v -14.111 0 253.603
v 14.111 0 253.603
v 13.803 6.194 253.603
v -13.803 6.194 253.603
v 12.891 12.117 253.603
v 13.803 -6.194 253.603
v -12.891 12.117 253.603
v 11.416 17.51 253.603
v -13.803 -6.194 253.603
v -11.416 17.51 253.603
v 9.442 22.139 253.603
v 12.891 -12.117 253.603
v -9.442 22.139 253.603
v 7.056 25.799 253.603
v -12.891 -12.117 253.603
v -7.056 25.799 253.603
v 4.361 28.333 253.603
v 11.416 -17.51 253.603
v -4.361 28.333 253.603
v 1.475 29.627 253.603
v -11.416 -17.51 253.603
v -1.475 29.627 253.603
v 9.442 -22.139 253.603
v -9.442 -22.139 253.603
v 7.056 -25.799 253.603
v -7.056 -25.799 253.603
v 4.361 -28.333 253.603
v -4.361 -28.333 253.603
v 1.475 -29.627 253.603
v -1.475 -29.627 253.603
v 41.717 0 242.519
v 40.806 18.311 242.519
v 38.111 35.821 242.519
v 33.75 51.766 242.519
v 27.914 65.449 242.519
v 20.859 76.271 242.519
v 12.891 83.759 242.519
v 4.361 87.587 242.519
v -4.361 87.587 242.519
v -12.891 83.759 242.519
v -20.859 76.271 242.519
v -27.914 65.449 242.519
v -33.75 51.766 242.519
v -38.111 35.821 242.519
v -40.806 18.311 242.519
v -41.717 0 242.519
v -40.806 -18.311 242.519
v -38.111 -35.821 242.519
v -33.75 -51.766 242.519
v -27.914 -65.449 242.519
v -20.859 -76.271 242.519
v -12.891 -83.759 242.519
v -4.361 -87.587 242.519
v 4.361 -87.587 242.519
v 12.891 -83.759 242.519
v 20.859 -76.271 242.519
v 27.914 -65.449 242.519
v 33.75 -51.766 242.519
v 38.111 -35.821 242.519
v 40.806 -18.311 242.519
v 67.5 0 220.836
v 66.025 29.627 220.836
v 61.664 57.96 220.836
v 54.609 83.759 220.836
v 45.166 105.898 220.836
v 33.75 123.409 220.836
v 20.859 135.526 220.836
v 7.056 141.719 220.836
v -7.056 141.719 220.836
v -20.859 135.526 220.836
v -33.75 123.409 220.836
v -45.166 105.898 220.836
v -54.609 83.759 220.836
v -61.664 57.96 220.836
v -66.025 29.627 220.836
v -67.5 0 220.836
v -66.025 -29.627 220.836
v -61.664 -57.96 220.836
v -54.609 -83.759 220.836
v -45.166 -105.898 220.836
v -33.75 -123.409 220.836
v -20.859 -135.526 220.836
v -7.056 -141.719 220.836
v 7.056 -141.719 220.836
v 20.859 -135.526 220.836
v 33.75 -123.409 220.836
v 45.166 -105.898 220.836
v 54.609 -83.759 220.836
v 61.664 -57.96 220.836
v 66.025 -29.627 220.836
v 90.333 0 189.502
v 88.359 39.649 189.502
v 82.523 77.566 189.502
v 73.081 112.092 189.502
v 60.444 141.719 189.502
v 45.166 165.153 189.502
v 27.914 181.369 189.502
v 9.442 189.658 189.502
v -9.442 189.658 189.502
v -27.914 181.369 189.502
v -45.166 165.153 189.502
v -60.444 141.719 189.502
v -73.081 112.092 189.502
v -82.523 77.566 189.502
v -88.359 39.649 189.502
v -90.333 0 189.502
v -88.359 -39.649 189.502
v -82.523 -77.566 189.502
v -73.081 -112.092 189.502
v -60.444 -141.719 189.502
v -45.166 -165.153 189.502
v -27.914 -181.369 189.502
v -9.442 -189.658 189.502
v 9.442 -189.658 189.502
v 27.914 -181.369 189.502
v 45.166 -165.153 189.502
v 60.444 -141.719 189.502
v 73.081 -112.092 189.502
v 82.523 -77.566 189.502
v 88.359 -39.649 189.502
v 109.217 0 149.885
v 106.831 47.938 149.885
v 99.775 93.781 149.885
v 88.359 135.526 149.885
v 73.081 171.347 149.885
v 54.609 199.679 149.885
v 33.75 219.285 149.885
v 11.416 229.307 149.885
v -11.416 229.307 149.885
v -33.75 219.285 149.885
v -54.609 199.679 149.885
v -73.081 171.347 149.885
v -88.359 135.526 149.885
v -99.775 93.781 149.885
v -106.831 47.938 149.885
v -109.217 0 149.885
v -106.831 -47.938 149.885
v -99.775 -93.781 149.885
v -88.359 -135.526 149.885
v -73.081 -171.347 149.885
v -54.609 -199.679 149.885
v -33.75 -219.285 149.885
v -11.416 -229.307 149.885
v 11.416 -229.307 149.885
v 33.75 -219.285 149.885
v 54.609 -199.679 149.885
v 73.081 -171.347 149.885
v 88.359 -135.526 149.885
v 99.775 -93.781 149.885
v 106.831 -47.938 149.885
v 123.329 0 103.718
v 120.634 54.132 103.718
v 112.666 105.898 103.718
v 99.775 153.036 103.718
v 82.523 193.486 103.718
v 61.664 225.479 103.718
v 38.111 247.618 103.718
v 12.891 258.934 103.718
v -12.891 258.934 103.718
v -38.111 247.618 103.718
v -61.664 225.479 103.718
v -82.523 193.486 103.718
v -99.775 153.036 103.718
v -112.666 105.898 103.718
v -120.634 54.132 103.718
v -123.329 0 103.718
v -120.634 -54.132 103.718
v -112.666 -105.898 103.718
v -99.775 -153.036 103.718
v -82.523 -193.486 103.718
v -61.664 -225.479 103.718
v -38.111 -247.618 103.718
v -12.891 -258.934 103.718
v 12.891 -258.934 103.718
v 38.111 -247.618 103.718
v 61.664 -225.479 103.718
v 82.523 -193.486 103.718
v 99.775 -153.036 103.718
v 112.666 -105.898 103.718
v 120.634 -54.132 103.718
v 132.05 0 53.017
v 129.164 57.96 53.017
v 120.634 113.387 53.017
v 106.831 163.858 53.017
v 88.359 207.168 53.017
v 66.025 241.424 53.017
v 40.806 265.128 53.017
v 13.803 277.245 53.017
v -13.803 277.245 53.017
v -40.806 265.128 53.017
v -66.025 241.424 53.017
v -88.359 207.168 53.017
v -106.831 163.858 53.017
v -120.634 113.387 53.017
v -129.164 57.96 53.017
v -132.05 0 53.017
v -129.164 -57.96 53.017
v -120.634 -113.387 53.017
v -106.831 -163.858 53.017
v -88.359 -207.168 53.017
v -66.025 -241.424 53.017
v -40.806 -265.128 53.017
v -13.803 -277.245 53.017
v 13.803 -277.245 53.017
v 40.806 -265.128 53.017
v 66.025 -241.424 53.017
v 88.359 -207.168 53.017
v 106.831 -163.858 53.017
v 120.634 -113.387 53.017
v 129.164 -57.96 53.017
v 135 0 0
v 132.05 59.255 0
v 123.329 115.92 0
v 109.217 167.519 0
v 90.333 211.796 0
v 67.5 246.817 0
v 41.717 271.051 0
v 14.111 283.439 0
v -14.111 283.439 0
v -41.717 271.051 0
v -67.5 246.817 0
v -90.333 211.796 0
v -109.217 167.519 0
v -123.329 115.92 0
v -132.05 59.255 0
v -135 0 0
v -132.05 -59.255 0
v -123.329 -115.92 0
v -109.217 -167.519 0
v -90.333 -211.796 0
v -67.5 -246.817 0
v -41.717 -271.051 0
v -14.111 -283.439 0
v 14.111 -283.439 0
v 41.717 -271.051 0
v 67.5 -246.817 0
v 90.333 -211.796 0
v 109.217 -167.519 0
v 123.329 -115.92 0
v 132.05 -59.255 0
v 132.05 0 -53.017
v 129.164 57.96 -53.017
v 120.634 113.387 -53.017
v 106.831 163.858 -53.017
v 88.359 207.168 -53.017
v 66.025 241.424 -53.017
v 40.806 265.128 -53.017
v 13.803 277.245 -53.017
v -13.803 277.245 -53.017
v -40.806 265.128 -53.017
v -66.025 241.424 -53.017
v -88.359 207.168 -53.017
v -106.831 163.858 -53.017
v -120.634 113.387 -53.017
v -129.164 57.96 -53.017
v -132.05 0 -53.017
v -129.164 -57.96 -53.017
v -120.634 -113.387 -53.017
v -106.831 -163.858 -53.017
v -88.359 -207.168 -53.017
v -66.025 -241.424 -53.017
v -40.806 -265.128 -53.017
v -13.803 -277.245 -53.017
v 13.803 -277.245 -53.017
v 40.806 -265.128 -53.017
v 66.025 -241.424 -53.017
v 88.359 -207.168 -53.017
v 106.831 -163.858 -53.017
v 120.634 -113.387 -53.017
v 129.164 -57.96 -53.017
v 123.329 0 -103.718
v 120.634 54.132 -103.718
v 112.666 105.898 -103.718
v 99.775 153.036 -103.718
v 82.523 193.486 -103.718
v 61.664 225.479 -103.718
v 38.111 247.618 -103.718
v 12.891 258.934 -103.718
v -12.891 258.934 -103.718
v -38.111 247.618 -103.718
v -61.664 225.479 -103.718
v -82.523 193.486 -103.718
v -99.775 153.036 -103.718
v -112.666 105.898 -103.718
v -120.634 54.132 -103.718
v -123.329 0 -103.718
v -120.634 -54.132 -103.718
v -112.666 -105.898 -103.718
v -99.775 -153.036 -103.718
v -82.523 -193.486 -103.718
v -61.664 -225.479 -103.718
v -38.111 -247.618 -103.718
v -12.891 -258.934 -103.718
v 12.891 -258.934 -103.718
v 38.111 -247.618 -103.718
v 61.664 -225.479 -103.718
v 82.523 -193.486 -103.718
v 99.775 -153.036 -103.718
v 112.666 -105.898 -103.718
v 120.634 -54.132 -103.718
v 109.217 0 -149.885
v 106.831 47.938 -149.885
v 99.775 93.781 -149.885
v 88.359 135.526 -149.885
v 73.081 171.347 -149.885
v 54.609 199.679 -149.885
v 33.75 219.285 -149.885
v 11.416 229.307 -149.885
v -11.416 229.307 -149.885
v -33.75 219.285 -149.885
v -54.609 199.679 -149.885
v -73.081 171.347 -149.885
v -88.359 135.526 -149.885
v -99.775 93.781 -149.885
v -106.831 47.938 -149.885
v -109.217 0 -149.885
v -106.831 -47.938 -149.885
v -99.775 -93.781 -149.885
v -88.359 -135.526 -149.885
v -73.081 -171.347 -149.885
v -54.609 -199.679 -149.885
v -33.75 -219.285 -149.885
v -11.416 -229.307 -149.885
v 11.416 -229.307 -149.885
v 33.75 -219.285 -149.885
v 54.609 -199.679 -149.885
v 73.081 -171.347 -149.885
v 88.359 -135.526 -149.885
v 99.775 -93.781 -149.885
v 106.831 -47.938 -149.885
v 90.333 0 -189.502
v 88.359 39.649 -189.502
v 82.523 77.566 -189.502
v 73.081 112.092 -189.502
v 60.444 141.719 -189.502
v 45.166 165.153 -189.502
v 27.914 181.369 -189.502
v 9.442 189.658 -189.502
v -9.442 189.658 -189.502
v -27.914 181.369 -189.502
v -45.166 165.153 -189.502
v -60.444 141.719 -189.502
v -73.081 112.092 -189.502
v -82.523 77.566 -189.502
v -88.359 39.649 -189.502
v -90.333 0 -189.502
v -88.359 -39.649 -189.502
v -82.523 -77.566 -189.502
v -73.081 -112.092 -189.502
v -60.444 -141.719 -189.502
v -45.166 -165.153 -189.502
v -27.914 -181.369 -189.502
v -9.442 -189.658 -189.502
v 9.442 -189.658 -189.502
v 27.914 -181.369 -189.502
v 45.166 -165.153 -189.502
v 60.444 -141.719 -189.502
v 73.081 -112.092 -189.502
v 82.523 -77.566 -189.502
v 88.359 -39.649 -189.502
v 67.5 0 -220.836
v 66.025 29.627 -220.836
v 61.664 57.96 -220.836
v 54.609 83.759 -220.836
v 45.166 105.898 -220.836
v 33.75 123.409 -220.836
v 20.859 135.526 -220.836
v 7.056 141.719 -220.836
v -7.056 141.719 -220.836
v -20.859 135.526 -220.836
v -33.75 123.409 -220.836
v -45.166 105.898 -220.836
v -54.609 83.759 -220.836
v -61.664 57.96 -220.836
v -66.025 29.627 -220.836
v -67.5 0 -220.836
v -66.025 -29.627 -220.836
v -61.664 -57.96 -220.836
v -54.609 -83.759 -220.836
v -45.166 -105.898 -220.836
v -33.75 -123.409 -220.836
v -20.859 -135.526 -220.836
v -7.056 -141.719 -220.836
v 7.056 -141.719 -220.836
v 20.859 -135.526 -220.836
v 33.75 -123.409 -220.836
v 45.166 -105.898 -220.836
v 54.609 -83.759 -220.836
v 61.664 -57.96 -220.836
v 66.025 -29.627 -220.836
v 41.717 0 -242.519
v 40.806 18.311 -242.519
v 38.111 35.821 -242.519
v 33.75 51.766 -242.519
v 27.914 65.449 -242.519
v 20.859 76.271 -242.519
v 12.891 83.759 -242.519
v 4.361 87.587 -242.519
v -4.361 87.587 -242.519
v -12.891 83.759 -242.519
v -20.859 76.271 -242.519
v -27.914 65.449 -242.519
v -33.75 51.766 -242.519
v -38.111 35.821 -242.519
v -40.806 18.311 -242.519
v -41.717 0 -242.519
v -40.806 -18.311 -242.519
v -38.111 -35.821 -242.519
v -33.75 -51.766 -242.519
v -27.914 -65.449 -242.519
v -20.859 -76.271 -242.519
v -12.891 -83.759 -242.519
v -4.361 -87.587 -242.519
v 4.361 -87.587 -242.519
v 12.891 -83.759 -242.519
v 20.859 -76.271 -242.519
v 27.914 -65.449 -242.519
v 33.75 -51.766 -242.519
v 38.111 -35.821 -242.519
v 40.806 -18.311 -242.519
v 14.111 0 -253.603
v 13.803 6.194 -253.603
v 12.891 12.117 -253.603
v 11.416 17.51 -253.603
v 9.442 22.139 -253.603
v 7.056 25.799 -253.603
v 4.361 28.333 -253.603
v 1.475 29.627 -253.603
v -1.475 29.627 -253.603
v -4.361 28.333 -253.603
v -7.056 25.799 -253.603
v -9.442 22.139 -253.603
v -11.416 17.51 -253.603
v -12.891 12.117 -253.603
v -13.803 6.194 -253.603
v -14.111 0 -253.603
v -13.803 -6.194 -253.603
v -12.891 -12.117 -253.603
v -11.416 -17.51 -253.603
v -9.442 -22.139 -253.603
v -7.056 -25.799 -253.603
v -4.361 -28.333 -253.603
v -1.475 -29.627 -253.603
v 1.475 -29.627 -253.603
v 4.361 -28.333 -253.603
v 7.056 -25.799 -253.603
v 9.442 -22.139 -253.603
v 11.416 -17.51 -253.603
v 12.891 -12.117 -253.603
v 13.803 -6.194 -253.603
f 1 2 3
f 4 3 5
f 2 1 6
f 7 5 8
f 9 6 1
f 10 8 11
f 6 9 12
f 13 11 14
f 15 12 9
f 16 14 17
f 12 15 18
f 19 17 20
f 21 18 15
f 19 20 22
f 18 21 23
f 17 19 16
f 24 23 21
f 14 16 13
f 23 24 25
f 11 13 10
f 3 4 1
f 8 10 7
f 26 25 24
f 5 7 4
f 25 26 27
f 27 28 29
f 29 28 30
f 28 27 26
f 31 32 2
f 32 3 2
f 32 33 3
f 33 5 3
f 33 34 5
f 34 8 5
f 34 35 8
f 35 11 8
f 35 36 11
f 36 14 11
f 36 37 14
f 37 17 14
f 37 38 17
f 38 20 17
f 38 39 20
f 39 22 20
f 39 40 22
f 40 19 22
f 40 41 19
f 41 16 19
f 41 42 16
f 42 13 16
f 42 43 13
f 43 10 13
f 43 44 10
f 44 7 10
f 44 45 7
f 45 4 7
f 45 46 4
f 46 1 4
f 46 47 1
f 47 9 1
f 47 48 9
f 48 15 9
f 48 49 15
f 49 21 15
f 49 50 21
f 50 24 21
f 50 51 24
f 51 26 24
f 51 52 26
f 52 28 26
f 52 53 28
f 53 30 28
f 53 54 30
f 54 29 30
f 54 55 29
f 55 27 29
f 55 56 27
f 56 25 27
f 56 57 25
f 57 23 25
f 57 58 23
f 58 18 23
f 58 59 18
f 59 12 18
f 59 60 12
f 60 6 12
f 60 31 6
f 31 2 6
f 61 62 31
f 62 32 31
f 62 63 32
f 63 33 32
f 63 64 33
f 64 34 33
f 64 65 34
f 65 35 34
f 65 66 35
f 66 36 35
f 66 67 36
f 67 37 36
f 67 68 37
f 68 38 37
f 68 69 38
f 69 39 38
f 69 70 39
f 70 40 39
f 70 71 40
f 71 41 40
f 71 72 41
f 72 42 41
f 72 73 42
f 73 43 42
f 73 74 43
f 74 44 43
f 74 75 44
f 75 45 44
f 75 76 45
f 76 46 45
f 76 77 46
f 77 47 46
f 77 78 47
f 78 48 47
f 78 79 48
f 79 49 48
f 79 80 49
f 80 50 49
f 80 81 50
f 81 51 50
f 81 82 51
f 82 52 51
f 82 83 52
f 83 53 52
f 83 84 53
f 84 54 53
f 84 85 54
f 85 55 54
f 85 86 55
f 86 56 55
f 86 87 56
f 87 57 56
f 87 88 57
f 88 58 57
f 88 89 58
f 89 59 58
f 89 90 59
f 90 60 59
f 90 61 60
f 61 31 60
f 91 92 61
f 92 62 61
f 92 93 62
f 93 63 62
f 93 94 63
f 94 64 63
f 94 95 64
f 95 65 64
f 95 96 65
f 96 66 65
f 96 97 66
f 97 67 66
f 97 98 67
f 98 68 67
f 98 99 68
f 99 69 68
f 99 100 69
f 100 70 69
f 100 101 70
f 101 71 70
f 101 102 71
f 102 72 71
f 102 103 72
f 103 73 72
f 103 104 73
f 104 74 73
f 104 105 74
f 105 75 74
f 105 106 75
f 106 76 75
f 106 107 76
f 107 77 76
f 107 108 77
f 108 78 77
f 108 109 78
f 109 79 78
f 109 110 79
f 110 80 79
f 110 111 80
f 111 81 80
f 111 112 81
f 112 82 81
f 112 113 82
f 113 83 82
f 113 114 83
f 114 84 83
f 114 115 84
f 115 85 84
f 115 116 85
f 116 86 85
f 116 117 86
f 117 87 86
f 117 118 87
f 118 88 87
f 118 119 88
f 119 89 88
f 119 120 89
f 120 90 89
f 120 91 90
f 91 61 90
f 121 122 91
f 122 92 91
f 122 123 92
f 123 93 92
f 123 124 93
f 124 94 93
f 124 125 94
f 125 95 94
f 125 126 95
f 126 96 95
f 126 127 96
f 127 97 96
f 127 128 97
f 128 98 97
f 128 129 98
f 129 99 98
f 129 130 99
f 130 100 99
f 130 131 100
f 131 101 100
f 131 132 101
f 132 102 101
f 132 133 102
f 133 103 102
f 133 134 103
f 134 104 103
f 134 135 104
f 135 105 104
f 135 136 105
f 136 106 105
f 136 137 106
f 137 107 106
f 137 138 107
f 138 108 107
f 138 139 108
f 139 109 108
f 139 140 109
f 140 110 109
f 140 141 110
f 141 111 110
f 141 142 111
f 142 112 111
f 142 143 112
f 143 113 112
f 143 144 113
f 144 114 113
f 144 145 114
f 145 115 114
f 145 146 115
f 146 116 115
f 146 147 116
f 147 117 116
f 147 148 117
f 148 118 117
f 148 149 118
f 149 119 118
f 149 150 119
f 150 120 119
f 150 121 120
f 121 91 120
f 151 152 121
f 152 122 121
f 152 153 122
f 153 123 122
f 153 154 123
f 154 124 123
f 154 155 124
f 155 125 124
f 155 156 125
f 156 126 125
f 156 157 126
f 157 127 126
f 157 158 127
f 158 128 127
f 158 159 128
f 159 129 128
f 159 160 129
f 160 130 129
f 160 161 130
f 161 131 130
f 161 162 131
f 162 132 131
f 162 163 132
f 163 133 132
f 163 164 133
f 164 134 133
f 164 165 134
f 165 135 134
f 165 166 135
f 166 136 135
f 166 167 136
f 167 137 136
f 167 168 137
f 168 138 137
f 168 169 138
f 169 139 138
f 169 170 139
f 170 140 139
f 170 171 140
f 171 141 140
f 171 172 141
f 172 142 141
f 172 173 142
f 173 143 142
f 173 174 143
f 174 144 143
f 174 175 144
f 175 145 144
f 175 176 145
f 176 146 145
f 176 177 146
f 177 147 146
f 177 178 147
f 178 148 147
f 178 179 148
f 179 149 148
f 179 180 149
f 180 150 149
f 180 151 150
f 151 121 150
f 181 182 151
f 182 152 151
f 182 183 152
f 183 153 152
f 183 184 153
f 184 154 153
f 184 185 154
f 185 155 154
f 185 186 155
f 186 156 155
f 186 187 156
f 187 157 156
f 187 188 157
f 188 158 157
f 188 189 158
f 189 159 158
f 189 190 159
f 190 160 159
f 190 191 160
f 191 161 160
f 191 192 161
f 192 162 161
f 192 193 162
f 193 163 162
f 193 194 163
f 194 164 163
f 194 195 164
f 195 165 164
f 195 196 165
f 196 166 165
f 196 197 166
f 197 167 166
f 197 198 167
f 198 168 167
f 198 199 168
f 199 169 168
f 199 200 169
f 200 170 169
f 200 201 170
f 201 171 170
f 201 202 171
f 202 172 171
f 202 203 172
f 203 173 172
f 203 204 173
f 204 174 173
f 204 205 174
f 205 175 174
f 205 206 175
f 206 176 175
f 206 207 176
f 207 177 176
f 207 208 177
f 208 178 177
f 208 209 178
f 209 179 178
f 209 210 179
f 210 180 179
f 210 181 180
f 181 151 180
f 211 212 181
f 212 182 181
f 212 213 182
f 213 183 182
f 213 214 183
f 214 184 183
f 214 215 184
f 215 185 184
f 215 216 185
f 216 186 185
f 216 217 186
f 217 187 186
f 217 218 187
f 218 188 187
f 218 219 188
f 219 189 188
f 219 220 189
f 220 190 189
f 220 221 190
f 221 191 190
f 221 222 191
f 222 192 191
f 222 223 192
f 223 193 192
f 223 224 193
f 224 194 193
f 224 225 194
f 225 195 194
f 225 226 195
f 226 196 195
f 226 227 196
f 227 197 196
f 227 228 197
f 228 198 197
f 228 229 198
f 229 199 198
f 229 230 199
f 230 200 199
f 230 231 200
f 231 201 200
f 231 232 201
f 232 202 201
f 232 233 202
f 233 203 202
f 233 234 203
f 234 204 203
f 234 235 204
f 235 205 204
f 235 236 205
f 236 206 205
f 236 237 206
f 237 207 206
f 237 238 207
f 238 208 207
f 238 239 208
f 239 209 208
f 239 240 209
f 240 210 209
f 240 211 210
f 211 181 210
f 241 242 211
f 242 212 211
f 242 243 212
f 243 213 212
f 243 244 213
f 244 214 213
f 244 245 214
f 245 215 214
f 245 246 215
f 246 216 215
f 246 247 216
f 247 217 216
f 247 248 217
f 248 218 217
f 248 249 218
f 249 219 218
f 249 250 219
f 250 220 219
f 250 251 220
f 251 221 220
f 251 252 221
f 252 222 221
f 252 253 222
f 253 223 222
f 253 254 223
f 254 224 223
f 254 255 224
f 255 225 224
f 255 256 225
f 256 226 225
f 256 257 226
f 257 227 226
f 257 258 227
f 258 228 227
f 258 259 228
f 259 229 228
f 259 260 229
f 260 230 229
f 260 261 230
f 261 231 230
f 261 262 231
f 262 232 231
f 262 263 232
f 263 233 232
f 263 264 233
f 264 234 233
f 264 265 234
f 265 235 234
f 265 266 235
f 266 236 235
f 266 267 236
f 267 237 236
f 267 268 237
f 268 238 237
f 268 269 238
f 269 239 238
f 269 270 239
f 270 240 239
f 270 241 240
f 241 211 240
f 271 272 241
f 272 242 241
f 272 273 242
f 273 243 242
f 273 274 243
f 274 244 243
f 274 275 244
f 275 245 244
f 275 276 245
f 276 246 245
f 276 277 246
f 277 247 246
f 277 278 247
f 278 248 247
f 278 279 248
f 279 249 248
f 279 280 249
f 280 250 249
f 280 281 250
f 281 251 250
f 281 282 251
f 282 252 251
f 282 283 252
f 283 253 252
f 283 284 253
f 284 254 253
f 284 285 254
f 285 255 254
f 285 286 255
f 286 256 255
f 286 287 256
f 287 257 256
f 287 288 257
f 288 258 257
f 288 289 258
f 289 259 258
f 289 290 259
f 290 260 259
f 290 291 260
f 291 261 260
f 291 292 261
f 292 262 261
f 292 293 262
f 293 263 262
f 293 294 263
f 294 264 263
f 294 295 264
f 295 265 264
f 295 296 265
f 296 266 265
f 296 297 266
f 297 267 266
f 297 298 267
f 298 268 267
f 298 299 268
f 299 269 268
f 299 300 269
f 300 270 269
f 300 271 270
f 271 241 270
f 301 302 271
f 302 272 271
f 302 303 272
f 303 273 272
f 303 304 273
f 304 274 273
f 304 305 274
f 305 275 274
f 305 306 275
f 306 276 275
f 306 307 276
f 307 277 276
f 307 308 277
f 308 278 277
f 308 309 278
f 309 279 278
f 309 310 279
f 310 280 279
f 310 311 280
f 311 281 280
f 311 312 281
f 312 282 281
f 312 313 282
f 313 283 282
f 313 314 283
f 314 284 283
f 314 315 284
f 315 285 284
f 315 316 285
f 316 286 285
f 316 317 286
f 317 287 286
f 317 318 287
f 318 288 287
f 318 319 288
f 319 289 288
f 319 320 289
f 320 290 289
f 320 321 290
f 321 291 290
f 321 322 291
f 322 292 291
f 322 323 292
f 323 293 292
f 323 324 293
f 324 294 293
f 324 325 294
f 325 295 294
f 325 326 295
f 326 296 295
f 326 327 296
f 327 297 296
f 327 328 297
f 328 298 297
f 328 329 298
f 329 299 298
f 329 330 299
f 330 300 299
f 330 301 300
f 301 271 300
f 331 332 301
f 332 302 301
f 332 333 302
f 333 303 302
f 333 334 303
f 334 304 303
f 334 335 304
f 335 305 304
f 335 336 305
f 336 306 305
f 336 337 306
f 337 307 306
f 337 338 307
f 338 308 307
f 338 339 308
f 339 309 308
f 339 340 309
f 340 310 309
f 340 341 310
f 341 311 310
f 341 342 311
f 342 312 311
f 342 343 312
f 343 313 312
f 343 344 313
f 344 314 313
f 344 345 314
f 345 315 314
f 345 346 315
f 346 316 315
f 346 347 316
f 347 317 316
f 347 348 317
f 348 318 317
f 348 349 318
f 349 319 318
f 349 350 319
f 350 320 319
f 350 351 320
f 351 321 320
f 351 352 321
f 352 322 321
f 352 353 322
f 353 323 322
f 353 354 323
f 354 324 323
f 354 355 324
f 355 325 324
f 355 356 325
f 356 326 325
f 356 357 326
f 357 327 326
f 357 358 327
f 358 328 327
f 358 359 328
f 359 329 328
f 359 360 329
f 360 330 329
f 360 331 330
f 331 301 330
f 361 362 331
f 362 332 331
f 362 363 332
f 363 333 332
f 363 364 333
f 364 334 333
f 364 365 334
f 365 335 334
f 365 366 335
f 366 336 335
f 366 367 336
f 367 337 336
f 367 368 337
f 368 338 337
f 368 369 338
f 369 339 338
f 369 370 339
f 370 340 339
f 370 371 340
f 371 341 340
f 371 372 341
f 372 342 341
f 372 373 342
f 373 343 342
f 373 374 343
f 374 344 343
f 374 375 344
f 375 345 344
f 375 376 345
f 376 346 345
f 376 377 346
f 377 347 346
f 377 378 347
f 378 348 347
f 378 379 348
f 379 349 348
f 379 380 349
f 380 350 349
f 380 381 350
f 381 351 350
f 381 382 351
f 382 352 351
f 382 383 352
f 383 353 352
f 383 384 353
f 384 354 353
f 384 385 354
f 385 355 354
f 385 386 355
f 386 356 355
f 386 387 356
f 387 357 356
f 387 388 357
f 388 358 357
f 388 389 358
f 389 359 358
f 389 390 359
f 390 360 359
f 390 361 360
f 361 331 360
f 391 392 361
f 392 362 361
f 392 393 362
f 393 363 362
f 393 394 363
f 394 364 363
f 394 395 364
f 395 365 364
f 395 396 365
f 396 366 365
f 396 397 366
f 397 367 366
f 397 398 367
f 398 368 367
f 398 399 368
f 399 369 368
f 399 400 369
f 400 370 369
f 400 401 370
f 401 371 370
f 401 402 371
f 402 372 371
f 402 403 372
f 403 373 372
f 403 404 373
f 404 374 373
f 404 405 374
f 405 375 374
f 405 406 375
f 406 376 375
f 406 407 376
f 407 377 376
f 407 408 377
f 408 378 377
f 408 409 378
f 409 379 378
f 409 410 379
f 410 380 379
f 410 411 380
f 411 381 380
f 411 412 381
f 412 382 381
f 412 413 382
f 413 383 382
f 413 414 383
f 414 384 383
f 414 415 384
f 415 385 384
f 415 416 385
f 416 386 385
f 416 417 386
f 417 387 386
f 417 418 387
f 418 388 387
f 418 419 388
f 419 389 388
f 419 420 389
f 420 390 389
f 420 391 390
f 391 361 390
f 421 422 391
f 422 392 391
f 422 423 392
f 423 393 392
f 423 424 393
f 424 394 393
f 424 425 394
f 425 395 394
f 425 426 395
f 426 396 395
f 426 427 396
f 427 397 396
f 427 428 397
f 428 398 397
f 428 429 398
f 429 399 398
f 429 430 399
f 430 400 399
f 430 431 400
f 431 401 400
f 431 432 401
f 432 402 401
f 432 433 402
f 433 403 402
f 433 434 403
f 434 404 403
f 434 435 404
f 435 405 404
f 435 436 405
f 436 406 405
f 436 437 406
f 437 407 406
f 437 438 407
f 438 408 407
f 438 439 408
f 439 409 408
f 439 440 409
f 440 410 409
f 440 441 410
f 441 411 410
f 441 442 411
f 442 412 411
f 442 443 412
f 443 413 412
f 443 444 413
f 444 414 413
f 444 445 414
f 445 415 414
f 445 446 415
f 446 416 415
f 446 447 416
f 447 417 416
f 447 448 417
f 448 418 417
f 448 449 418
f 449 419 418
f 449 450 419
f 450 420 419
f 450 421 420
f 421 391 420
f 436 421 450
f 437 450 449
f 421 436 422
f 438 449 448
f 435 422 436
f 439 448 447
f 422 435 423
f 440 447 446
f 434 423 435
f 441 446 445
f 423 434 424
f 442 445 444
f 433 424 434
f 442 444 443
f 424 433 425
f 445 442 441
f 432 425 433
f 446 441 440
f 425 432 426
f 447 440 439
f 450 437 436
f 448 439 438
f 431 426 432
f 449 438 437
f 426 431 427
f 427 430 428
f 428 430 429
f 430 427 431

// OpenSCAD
// Generated by SolidPython 1.0.1 on 2020-07-29 00:46:49


scale(v = [9, 19, 17]) {
	sphere(r = 15);
}
/***********************************************
*********      SolidPython code:      **********
************************************************
 
# import packages: SolidPython
from solid import *
from solid.utils import *
from itertools import chain, combinations, permutations


class Resize:

    def __init__(self, scad_file):
        self.scad_file = scad_file
        #self.scad_file = import_scad(scad_file)
        # cone/cylinder param:
        self.r1 = 0
        self.r2 = 0
        self.h = 0
        # rectangular prism param:
        self.w = 0
        self.l = 0
        # ellipse param:
        self.r = 0

    # import OpenScad code (file name corresponds to shape)


    # classify shape + parameters
    def assign(self, param1, param2, param3):
        if self.scad_file == 'cone.scad':
            self.r1 = param1
            self.r2 = param2
            self.h = param3
        elif self.scad_file == 'cylinder.scad':
            self.r1 = param1
            self.r2 = param2
            self.h = param3
        elif self.scad_file == 'rectangularPrism.scad':
            self.h = param1
            self.l = param2
            self.w = param3
        else:
            self.r = param1
            self.h = param2

    # resize parameters
    def iterate(self):
        x = range(3, 20, 2)
        i = 1
        if self.scad_file == 'cone.scad':
            tempList = list(permutations(x, 2))
            for temp in tempList:
                param1 = temp[0]
                param2 = temp[1]
                filepath = 'produced_scad_files/' + 'cone' + str(param1) + '_' + str(param2) + '_' + '.scad'
                scad_render_to_file(cylinder(h=param1, r1=param2, r2=0), filepath)

        elif self.scad_file == 'cylinder.scad':
            tempList = list(permutations(x, 3))
            for temp in tempList:
                param1 = temp[0]
                param2 = temp[1]
                filepath = 'produced_scad_files/' + 'cylinder' + str(param1) + '_' + str(param2) + '_' + '.scad'
                scad_render_to_file(cylinder(h=param1, r1=param2, r2=param2), filepath)

        elif self.scad_file == 'rectangularPrism.scad':
            tempList = list(permutations(x, 3))
            for temp in tempList:
                param1 = temp[0]
                param2 = temp[1]
                param3 = temp[2]
                filepath = 'produced_scad_files/' + 'rectangularPrism' + str(param1) + '_' + str(param2) + '_' + str(
                    param3) + '.scad'
                scad_render_to_file(cube(size=(param1, param2, param3)), filepath)

        elif self.scad_file == 'ellipse.scad':
            tempList = list(permutations(x, 4))
            for temp in tempList:
                param1 = temp[0]
                param2 = temp[1]
                param3 = temp[2]
                param4 = temp[3]
                filepath = 'produced_scad_files/' + 'ellipse' + str(param1) + '_' + str(param2) + '_' + str(param3) + '_' + str(param4) + '.scad'
                scad_render_to_file(scale([param1, param2, param3])(sphere(r=param4)), filepath)

    def render_to_scadfile(self):
        scad_render_to_file(scad, 'example.scad') 
 
************************************************/
